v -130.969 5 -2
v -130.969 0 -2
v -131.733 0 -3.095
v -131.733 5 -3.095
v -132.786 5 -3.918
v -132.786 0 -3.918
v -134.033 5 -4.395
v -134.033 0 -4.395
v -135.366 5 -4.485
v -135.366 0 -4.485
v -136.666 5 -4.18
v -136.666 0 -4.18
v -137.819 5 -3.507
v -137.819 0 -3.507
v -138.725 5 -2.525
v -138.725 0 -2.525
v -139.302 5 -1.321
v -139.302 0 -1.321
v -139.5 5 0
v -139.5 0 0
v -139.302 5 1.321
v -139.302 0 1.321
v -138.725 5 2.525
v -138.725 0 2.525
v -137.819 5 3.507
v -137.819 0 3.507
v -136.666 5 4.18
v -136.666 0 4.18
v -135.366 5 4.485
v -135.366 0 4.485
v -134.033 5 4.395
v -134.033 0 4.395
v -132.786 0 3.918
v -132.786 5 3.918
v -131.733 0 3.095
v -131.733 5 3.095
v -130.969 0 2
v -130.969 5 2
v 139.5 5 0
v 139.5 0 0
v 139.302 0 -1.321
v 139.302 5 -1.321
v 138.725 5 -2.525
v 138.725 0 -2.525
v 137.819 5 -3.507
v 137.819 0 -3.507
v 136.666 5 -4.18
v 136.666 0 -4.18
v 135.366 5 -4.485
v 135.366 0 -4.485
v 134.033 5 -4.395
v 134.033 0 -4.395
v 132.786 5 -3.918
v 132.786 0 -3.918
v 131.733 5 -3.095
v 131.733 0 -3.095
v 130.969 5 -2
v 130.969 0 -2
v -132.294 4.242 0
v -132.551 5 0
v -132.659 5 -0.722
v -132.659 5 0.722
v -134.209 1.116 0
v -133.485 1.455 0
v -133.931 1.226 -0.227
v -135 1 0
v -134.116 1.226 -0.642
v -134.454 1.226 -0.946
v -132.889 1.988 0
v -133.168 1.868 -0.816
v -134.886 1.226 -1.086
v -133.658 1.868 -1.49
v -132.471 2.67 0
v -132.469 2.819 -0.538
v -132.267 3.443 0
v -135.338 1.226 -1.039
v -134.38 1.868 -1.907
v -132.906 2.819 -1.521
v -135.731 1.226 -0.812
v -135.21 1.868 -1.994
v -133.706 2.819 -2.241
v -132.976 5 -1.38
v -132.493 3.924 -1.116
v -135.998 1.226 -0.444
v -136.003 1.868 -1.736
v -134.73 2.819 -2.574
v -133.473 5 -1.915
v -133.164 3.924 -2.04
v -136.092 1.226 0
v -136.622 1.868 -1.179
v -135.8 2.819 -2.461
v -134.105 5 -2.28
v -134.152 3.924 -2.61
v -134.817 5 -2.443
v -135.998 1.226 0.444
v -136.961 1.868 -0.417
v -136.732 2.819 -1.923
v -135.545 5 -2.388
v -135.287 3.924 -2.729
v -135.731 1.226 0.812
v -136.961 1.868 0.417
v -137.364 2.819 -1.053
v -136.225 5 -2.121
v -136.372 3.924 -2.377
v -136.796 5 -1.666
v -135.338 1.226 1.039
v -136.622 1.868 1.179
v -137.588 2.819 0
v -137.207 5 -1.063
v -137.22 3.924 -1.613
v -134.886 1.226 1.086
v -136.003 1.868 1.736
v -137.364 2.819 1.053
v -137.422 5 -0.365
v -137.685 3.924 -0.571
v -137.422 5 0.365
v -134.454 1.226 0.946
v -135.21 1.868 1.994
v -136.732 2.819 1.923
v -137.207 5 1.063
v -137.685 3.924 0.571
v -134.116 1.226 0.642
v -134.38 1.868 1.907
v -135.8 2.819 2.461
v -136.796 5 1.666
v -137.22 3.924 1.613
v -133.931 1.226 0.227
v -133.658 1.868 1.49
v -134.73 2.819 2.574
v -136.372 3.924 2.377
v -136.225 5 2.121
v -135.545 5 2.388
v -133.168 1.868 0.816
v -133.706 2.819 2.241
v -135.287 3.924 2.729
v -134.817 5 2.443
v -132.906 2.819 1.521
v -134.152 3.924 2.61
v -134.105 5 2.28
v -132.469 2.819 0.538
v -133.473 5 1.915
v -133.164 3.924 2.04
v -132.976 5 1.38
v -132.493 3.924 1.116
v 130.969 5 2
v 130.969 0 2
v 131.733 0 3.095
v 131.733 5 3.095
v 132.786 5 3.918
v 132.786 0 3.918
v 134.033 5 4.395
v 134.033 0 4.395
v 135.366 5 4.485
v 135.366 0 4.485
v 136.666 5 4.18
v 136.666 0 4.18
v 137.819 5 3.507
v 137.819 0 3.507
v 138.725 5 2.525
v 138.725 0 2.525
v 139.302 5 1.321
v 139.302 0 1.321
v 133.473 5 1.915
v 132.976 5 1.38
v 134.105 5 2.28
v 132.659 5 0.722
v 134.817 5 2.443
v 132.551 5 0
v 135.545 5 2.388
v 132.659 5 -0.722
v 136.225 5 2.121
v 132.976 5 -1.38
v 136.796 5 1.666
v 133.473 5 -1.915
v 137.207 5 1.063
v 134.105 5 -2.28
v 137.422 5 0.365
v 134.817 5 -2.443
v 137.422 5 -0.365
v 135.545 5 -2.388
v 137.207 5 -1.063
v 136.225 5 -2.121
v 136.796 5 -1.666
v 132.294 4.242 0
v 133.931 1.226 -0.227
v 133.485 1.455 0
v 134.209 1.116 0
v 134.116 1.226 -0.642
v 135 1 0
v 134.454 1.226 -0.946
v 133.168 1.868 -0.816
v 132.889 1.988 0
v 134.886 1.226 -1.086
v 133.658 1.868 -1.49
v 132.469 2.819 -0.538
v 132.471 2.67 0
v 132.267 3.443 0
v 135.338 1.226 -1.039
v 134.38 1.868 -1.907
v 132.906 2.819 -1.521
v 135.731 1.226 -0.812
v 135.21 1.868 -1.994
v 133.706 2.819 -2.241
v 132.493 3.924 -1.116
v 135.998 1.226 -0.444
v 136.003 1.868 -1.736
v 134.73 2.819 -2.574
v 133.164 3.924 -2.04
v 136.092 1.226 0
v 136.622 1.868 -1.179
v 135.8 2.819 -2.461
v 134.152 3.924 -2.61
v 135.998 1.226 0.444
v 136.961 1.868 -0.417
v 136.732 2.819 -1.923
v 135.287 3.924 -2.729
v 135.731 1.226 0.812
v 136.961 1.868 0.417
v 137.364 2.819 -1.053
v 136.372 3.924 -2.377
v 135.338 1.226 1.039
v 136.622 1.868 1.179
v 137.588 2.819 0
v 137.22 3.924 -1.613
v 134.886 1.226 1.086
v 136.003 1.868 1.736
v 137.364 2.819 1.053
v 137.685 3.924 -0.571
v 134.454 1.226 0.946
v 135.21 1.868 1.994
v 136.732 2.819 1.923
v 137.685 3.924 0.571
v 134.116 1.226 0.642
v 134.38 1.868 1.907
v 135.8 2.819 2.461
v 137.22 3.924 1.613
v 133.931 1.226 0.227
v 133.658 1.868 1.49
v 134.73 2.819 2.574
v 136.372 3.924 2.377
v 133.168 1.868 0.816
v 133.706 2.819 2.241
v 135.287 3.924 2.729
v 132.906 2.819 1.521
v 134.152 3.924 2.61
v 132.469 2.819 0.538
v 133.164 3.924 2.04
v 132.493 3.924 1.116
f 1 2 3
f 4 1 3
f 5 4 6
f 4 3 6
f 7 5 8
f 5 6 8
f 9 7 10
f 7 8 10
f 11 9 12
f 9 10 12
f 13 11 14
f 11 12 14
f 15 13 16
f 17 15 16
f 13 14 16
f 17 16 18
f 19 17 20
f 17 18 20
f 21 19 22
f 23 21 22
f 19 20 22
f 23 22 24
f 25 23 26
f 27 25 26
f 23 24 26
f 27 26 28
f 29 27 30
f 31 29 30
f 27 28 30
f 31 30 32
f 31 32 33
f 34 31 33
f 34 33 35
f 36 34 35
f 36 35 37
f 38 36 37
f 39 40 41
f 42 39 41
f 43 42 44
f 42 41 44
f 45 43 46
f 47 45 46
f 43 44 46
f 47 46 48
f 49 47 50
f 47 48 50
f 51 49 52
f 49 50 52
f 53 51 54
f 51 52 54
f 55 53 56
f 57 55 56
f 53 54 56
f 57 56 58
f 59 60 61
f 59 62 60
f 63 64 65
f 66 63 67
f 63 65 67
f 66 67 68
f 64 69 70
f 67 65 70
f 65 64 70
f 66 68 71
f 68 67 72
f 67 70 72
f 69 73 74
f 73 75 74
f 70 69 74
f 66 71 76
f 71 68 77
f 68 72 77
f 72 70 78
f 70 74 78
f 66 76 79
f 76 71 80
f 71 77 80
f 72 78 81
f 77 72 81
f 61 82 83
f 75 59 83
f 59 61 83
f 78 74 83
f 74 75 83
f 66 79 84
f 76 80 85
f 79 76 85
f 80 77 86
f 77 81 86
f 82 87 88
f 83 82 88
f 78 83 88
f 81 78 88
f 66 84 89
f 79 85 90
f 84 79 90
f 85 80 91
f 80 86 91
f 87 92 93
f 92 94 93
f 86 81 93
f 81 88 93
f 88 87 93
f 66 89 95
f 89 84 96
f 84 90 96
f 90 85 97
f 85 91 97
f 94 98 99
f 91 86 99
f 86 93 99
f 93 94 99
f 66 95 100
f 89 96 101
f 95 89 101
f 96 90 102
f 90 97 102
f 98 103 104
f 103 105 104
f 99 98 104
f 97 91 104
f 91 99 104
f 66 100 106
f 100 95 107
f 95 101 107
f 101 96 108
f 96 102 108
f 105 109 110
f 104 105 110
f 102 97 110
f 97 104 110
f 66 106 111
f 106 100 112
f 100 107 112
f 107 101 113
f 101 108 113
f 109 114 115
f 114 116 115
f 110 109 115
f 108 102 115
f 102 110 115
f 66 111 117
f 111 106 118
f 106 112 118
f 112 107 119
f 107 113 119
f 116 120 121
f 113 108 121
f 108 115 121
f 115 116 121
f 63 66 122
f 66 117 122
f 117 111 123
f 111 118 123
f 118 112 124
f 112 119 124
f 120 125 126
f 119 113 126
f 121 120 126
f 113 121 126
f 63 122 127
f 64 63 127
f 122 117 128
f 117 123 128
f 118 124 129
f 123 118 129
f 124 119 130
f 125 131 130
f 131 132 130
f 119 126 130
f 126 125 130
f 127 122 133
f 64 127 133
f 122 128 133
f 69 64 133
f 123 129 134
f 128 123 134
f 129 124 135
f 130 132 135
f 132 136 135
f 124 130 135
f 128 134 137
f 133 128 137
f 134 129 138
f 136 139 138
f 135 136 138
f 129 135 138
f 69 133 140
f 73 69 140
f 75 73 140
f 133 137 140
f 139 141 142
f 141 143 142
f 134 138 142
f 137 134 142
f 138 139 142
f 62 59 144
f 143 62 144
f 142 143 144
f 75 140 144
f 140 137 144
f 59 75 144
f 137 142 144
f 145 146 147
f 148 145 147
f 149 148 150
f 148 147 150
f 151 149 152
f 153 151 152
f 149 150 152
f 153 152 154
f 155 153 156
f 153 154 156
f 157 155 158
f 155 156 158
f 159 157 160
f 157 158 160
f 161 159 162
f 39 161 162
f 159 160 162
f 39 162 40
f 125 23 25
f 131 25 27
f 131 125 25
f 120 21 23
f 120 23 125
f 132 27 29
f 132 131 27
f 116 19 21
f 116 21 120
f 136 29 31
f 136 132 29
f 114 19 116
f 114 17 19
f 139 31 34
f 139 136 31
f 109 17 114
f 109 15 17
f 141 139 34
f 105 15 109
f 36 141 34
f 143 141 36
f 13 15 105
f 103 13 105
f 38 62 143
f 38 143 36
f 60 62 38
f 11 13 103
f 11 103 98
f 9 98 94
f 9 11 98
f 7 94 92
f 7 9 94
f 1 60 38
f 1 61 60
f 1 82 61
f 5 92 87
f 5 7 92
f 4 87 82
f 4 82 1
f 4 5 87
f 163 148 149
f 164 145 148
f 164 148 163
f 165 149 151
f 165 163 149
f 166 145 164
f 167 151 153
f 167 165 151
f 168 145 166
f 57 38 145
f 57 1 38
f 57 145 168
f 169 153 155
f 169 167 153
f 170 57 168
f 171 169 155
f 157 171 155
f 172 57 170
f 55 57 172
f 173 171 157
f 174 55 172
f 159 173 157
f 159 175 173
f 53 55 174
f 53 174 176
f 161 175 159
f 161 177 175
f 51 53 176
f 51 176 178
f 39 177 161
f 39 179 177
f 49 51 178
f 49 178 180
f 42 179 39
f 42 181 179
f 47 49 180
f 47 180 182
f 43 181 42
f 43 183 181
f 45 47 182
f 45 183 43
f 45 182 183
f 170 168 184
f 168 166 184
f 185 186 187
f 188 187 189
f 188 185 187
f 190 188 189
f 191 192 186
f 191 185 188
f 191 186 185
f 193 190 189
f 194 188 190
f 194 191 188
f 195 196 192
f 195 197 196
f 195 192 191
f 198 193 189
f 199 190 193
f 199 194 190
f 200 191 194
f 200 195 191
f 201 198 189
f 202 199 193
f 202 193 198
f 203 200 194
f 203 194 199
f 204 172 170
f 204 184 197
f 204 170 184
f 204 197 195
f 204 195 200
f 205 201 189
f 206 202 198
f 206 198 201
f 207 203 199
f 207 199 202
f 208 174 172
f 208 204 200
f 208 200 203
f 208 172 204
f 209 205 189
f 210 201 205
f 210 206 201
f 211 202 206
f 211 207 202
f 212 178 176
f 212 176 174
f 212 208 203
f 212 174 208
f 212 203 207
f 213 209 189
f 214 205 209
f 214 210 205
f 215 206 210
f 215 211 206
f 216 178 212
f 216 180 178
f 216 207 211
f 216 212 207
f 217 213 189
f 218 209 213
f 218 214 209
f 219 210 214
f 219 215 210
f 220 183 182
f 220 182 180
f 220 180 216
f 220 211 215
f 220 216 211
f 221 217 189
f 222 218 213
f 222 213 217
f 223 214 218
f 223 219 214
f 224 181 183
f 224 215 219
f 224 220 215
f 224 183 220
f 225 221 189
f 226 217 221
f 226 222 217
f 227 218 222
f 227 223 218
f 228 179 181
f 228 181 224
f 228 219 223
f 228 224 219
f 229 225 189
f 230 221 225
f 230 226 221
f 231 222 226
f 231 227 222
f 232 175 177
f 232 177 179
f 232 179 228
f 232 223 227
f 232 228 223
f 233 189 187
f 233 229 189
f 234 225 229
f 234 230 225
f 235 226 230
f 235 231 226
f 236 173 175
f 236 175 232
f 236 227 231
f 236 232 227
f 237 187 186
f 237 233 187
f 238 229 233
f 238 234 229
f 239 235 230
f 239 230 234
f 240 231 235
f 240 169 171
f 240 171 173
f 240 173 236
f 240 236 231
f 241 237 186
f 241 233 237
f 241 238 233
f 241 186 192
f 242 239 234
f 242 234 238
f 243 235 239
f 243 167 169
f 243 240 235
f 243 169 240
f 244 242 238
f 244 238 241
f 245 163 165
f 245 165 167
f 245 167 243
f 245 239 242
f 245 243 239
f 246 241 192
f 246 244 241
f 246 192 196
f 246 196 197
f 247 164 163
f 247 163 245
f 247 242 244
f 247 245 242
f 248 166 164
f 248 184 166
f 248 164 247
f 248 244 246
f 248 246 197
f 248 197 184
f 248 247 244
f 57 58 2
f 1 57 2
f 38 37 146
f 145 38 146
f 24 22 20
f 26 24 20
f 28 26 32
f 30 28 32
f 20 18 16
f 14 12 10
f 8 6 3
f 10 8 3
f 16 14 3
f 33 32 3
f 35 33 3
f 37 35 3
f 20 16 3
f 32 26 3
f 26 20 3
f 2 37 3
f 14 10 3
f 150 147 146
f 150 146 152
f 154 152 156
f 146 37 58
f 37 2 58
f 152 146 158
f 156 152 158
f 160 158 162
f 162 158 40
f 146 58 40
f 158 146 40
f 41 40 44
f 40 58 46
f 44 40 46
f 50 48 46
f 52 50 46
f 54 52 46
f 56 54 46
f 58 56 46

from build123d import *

# Parameters (mm, degrees)
BOSS_EXTRUDE1_DEPTH = 5


with BuildPart() as part:
    # Sketch1 → Boss-Extrude1 (new body)
    with BuildSketch(Plane(origin=(0, 0, 0), x_dir=(1, 0, 0), z_dir=(0, 1, 0))):
        with BuildLine():
            Line((-135, 2), (-135, -2))
            Line((-135, -2), (-130.968871126, -2))
            ThreePointArc((-130.968871126, -2), (-130.61878556, -1.027112473), (-130.5, 0))
            ThreePointArc((-130.5, 0), (-130.61878556, 1.027112473), (-130.968871126, 2))
            Line((-130.968871126, 2), (-135, 2))
        make_face()
        with BuildLine():
            Line((-130.968871126, -2), (-135, -2))
            Line((-135, -2), (-135, 2))
            Line((-135, 2), (-130.968871126, 2))
            ThreePointArc((-130.968871126, 2), (-139.5, 0), (-130.968871126, -2))
        make_face()
        with BuildLine():
            ThreePointArc((-130.5, 0), (-130.61878556, -1.027112473), (-130.968871126, -2))
            Line((-130.968871126, -2), (130.968871126, -2))
            ThreePointArc((130.968871126, -2), (130.5, 0), (130.968871126, 2))
            Line((130.968871126, 2), (-130.968871126, 2))
            ThreePointArc((-130.968871126, 2), (-130.61878556, 1.027112473), (-130.5, 0))
        make_face()
        with BuildLine():
            ThreePointArc((130.968871126, 2), (130.5, 0), (130.968871126, -2))
            Line((130.968871126, -2), (135, -2))
            Line((135, -2), (135, 2))
            Line((135, 2), (130.968871126, 2))
        make_face()
        with BuildLine():
            Line((135, -2), (130.968871126, -2))
            ThreePointArc((130.968871126, -2), (136.027112473, -4.38121444), (139.5, 0))
            ThreePointArc((139.5, 0), (136.027112473, 4.38121444), (130.968871126, 2))
            Line((130.968871126, 2), (135, 2))
            Line((135, 2), (135, -2))
        make_face()
    extrude(amount=BOSS_EXTRUDE1_DEPTH)

    # Cut-Sweep1: sweep along a path in Sketch2
    with BuildLine(Plane(origin=(0, 5, 0), x_dir=(1, 0, 0), z_dir=(0, 1, 0))) as cut_sweep1_path:
        CenterArc((-135, 0), 4.5, 0, 360)
    # 3DSketch1 → Cut-Sweep1 (sweep, cut)
    with BuildSketch(Plane(origin=(-135, 5, 0), x_dir=(0, -1, 0), z_dir=(-1, 0, 0))):
        with BuildLine():
            Line((0, 0), (-1.5, 0))
            ThreePointArc((-1.5, 0), (1.25, -2.75), (4, 0))
            Line((4, 0), (0, 0))
        make_face()
    cut_sweep1 = sweep(path=cut_sweep1_path.line, mode=Mode.SUBTRACT)

    # Mirror1: Cut-Sweep1 across plane
    add(cut_sweep1.mirror(Plane(origin=(0, 0, 0), x_dir=(0, 0, 1), z_dir=(1, 0, 0))), mode=Mode.SUBTRACT)


solid = part.part
